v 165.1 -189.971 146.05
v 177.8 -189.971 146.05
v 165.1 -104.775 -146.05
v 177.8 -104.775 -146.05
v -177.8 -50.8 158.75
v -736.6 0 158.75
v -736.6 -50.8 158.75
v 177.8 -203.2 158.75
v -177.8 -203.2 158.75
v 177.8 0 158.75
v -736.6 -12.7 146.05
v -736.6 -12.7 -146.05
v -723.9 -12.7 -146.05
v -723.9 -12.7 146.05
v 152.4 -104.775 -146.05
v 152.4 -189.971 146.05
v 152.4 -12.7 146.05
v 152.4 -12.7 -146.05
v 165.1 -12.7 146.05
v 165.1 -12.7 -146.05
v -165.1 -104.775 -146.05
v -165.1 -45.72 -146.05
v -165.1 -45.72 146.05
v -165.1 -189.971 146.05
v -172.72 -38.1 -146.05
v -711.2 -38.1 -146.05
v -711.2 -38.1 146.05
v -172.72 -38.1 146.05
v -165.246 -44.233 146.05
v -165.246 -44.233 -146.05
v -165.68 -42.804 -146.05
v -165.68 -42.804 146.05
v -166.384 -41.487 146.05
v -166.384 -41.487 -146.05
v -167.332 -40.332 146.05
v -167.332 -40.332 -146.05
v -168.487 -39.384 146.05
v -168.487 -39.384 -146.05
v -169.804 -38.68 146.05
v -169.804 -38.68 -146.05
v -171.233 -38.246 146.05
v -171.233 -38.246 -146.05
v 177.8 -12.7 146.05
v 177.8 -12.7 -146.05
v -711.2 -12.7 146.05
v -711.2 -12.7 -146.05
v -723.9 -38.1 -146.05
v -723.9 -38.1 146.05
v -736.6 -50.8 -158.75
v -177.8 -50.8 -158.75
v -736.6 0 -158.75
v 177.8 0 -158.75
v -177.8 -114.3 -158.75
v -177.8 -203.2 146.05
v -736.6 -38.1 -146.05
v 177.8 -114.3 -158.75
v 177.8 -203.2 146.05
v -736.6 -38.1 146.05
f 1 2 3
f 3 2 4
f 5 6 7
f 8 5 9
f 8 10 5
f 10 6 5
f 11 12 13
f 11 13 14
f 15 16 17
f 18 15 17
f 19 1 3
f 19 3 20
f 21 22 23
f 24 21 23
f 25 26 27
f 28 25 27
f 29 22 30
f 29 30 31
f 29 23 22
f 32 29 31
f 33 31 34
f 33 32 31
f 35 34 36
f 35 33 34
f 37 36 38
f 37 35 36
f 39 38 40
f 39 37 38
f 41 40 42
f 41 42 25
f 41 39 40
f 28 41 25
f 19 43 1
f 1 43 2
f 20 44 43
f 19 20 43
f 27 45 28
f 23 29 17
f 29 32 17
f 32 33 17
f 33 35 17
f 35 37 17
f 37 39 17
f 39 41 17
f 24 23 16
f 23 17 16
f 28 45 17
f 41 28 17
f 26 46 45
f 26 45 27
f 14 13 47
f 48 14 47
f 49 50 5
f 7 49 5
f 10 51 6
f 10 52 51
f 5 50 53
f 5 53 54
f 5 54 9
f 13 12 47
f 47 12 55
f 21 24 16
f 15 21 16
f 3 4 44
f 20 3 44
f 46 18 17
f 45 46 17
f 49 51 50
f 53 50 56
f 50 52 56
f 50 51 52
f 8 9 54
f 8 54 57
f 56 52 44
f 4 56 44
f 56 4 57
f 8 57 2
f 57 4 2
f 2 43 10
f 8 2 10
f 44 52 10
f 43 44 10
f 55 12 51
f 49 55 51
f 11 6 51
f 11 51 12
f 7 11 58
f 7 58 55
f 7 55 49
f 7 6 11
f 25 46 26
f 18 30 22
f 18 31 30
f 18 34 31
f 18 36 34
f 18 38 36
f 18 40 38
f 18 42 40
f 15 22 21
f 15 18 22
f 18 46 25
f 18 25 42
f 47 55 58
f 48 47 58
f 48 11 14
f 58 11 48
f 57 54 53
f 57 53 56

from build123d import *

# Parameters (mm, degrees)
F0_W     = 355.6
F0_H     = 317.5
F1_DEPTH = 203.2
F3_SIZE2 = 304.8
F3_SIZE  = 88.9
F4_W     = 50.8
F4_H     = 317.5
F5_DEPTH = 558.8
F7_DEPTH = 12.7
F8_W     = 25.4
F8_H     = 292.1
F9_DEPTH = 12.7
F10_T    = -12.7
F13_R    = 7.62


with BuildPart() as f1:
    # F0 (on Front) → F1 (new body)
    with BuildSketch(Plane.XZ):
        Rectangle(F0_W, F0_H)
    extrude(amount=F1_DEPTH)

    # F3
    f3_edges = [f1.edges().sort_by_distance(p)[0] for p in [
        (0, -203.2, -158.75),
    ]]
    f3_side = f1.faces().sort_by_distance((0, -101.6, -158.75))[0]
    chamfer(f3_edges, length=F3_SIZE, length2=F3_SIZE2, reference=f3_side)

    # F4 (on face) → F5 (join)
    with BuildSketch(Plane(origin=(-177.8, 0, 0), x_dir=(0, -1, 0), z_dir=(-1, 0, 0))):
        with Locations((25.4, 0)):
            Rectangle(F4_W, F4_H)
    extrude(amount=F5_DEPTH)

    # F6 (on face) → F7 (cut)
    with BuildSketch(Plane.YZ.offset(177.8)):
        Polygon((-12.7, 146.05), (-189.9708333333, 146.05), (-104.775, -146.05), (-12.7, -146.05), align=None)
    extrude(amount=-F7_DEPTH, mode=Mode.SUBTRACT)

    # F8 (on face) → F9 (cut)
    with BuildSketch(Plane(origin=(-736.6, 0, 0), x_dir=(0, -1, 0), z_dir=(-1, 0, 0))):
        with Locations((25.4, 0)):
            Rectangle(F8_W, F8_H)
    extrude(amount=-F9_DEPTH, mode=Mode.SUBTRACT)

    # F10 (hollow: no face is removed)
    offset(amount=F10_T, kind=Kind.INTERSECTION, mode=Mode.SUBTRACT)

    # F13
    f13_edges = [f1.edges().sort_by_distance(p)[0] for p in [
        (-165.1, -38.1, 0),
    ]]
    fillet(f13_edges, radius=F13_R)


solid = f1.part
